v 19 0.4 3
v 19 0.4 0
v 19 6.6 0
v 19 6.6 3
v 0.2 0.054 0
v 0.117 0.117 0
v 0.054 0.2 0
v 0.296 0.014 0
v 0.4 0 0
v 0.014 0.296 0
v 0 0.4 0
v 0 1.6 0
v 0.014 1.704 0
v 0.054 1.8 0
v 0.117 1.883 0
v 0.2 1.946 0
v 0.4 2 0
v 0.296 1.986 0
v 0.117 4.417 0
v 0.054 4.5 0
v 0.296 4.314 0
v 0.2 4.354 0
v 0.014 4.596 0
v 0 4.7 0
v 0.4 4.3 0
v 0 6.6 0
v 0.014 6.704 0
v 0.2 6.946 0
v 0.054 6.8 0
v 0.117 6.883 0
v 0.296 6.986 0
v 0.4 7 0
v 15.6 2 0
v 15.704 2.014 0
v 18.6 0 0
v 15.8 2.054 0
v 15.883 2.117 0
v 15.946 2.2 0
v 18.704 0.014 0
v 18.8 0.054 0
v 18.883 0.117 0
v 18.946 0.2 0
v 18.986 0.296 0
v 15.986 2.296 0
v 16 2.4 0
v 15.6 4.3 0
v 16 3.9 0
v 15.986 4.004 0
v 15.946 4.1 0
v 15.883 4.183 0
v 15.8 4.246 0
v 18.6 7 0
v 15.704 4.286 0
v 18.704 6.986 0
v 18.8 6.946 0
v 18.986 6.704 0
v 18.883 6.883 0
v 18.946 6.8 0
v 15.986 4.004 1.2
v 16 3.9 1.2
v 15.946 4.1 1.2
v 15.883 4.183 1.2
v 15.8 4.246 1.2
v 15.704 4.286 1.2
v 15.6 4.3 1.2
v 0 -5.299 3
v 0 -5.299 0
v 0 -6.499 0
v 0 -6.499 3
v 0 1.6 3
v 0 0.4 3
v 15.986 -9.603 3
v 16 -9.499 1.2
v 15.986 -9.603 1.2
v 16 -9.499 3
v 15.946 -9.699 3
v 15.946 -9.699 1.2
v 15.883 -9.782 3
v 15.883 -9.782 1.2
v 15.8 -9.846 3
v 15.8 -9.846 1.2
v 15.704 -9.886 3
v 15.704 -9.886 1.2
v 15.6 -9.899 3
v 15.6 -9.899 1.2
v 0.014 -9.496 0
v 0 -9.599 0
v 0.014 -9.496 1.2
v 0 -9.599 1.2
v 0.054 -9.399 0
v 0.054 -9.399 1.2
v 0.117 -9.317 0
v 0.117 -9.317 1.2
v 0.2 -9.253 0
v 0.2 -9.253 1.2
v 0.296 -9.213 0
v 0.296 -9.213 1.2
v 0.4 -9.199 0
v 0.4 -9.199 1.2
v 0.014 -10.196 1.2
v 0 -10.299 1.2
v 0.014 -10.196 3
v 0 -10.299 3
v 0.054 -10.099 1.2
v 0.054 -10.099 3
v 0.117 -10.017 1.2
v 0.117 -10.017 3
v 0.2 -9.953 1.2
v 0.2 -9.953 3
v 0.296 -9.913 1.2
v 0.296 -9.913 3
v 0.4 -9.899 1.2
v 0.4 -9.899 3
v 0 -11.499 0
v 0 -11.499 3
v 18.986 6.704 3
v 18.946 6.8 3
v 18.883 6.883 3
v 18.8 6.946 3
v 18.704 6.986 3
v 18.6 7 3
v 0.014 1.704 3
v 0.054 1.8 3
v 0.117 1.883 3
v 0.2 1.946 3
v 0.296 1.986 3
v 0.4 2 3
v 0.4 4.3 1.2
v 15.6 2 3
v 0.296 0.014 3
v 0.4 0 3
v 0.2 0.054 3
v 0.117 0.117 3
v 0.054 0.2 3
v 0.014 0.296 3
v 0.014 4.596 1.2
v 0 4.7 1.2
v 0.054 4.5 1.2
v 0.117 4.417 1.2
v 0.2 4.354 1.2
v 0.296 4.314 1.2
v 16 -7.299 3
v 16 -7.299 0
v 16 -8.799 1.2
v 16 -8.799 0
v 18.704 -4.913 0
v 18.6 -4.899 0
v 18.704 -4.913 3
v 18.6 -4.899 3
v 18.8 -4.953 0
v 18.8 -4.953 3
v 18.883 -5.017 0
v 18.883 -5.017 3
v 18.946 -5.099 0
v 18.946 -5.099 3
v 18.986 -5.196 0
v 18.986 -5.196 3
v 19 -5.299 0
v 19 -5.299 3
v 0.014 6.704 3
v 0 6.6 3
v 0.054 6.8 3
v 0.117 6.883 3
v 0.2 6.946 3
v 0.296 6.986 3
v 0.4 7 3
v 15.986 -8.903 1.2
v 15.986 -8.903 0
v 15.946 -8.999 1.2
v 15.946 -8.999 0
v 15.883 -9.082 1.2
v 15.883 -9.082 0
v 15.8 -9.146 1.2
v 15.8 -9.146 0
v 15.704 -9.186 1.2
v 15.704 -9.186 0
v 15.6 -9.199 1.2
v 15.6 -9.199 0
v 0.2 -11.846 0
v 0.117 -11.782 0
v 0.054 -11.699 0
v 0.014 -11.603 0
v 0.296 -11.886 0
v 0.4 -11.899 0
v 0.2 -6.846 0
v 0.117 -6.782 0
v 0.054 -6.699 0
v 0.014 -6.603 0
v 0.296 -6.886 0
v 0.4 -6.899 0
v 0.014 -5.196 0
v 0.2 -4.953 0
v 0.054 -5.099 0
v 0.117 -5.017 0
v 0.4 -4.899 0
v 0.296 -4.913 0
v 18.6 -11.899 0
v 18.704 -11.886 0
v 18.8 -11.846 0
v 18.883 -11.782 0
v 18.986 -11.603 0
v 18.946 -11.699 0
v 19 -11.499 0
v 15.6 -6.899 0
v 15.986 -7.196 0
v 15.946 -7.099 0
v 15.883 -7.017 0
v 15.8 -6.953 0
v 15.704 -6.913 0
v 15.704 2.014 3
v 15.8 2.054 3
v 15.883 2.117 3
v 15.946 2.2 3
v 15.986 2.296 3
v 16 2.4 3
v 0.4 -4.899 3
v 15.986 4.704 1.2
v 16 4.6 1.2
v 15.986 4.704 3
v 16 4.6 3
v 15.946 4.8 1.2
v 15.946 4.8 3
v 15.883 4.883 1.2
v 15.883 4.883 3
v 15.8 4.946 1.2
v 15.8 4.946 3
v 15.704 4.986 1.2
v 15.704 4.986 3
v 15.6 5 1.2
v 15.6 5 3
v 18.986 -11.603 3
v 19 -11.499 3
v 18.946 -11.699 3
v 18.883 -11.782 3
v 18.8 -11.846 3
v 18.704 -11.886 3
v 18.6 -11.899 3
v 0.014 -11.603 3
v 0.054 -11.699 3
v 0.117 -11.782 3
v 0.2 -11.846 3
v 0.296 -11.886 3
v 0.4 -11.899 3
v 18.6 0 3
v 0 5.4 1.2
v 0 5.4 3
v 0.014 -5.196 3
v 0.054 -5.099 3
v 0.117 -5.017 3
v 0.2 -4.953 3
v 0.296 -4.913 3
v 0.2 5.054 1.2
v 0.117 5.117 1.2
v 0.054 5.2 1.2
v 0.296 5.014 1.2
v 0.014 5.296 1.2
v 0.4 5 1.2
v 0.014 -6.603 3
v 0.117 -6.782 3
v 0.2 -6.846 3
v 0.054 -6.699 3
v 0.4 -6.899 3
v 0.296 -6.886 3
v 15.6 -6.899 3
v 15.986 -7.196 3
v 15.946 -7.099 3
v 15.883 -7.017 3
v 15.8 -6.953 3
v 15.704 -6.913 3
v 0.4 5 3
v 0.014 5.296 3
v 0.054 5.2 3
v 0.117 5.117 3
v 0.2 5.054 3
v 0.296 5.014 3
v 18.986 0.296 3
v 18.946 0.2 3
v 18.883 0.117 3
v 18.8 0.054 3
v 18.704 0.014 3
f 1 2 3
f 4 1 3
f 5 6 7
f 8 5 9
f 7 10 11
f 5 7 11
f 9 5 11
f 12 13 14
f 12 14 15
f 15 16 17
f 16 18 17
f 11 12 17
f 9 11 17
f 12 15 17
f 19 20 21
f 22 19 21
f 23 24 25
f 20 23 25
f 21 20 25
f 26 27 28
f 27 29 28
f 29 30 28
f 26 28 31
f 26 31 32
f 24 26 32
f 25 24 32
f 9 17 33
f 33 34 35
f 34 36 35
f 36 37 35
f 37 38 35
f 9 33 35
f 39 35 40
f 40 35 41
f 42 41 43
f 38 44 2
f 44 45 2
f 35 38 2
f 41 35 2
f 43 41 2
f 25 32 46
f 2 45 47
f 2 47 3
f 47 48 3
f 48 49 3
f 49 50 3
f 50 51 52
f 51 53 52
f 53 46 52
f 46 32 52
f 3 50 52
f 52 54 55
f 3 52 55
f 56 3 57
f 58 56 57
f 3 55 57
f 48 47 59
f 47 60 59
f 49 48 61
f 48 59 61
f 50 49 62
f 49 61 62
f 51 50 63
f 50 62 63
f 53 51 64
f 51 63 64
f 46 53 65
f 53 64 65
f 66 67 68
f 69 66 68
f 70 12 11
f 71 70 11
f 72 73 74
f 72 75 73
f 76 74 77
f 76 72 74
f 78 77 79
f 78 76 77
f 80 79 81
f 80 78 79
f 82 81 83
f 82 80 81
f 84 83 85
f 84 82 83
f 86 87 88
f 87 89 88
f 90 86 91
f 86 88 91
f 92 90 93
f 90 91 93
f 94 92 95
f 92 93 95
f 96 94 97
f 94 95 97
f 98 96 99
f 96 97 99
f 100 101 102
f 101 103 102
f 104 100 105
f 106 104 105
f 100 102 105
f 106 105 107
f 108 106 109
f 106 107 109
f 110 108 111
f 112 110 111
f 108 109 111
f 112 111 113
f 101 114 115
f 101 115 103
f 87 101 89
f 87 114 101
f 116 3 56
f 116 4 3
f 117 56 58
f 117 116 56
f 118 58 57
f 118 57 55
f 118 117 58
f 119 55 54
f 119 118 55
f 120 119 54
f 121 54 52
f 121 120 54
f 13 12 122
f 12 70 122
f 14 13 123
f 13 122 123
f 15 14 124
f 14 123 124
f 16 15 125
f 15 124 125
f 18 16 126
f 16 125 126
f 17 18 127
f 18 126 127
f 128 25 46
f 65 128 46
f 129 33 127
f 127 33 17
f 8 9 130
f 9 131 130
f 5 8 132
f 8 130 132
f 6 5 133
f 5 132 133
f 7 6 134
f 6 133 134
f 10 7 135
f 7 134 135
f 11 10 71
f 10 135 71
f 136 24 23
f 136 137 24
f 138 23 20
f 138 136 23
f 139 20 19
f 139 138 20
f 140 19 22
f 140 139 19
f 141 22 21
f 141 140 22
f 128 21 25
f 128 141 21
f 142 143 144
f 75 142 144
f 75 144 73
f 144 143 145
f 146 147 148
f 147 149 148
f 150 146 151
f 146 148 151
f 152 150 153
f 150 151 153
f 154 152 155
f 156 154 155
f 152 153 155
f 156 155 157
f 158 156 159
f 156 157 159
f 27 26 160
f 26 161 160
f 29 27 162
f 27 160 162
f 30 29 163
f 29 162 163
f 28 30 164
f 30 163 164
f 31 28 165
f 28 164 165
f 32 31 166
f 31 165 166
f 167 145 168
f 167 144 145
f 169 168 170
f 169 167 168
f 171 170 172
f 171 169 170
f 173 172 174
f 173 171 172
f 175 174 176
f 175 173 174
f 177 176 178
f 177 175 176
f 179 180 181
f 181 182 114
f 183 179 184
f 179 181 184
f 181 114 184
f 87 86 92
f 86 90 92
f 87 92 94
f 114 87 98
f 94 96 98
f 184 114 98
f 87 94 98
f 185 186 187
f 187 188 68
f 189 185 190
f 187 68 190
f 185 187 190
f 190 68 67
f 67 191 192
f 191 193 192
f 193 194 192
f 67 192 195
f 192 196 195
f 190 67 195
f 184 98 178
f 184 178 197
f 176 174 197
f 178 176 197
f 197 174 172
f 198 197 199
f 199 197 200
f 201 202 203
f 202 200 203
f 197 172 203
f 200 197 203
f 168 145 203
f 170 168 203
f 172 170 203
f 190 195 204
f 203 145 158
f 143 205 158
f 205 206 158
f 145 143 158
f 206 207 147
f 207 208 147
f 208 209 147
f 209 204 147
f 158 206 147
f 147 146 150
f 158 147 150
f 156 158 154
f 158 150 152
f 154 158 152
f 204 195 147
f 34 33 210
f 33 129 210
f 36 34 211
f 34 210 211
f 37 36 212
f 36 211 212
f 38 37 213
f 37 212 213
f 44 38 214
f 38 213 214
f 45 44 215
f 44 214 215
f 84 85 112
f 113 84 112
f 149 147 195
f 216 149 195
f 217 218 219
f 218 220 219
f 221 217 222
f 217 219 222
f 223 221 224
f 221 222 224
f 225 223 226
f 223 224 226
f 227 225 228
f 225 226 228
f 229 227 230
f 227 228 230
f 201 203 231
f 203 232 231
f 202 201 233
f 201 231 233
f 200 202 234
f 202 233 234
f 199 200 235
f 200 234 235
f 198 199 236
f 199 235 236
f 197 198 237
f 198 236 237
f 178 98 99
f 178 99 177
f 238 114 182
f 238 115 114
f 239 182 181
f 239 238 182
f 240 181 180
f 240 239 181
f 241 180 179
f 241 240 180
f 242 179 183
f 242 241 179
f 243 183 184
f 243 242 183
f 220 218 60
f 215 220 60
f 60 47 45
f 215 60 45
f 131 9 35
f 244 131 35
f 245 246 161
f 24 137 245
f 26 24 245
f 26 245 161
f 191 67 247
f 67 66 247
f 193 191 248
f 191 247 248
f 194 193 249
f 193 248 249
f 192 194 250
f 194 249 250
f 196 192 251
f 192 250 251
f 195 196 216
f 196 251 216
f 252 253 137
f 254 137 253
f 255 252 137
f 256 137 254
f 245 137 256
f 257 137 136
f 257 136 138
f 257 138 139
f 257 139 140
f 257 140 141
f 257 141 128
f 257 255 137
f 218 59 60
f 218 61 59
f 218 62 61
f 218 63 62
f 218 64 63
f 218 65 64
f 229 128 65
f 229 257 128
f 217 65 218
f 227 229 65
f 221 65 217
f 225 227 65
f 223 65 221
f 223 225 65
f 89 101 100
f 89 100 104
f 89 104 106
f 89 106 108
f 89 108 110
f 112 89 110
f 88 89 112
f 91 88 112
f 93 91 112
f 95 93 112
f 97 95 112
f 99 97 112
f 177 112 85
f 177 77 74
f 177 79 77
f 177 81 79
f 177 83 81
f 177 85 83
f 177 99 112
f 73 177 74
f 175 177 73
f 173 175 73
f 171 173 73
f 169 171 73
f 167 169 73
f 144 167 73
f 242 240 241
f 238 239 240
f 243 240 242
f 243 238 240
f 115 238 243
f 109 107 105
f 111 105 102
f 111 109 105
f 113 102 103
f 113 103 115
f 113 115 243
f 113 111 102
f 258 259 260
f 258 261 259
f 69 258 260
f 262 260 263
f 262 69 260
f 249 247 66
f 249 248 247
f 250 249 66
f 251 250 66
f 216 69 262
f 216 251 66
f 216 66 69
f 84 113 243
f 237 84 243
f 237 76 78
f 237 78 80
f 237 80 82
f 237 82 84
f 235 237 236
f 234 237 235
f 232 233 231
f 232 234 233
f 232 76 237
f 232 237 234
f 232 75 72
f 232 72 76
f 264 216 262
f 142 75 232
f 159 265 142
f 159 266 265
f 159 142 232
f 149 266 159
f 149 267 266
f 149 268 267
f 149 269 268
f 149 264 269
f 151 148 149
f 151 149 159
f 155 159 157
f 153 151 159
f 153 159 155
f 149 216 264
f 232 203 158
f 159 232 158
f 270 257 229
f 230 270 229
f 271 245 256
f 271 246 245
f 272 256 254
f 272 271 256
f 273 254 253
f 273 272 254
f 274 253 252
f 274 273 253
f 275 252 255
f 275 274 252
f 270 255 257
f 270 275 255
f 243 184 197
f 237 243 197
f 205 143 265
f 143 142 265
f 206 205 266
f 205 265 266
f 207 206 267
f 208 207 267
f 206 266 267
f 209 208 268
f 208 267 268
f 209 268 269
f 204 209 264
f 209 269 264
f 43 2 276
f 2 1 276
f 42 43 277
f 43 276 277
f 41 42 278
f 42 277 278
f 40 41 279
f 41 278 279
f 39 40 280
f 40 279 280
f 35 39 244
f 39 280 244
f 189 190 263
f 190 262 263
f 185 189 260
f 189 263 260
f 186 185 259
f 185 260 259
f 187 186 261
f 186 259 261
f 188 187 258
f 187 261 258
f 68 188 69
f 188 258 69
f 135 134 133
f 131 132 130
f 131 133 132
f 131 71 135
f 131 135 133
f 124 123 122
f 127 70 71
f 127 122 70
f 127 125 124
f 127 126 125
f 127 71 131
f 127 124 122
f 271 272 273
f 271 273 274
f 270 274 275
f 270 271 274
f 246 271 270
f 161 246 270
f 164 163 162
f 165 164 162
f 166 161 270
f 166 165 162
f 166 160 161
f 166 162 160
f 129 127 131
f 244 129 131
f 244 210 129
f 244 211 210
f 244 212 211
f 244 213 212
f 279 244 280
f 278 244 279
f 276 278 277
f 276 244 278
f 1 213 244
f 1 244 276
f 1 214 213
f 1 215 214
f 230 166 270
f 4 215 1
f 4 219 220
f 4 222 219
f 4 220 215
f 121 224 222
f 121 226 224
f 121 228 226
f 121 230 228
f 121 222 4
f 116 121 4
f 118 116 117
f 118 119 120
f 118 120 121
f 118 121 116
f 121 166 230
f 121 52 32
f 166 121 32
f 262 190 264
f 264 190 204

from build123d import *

# Parameters (mm, degrees)
BOSS_EXTRUDE1_DEPTH   = 3
BOSS_EXTRUDE1_2_DEPTH = 3
SKETCH2_4_W           = 16
SKETCH2_4_H           = 0.7
BOSS_EXTRUDE3_DEPTH   = 1.2
FILLET2_R             = 0.4
FILLET3_R             = 0.4


with BuildPart() as part:
    # Sketch2 → Boss-Extrude1 (new body)
    with BuildSketch(Plane.XY):
        Polygon((0, 2), (0, 0), (19, 0), (19, 7), (0, 7), (0, 5), (16, 5), (16, 2), align=None)
    extrude(amount=BOSS_EXTRUDE1_DEPTH)



with BuildPart() as body_2:
    # Sketch2 → Boss-Extrude1 2 (new body)
    with BuildSketch(Plane.XY):
        Polygon((16, -6.899471306), (16, -9.899471306), (0, -9.899471306), (0, -11.899471306), (19, -11.899471306), (19, -4.899471306), (0, -4.899471306), (0, -6.899471306), align=None)
    extrude(amount=BOSS_EXTRUDE1_2_DEPTH)


with BuildPart() as part_1:
    add(part.part)

    add(body_2.part)  # Boss-Extrude3 merges body 2
    # Sketch2<4> → Boss-Extrude3 (add)
    with BuildSketch(Plane.XY):
        with Locations((8, 4.65)):
            Rectangle(SKETCH2_4_W, SKETCH2_4_H)
        with Locations((8, -9.549471306)):
            Rectangle(SKETCH2_4_W, SKETCH2_4_H)
    extrude(amount=BOSS_EXTRUDE3_DEPTH)

    # Fillet2
    fillet2_edges = [part_1.edges().sort_by_distance(p)[0] for p in [
        (0, 5, 2.1),
        (16, 2, 1.5),
        (16, 4.3, 0.6),
        (16, 5, 2.1),
        (19, 7, 1.5),
        (19, 0, 1.5),
        (0, 0, 1.5),
        (0, 2, 1.5),
        (0, 4.3, 0.6),
        (0, 7, 1.5),
    ]]
    fillet(fillet2_edges, radius=FILLET2_R)

    # Fillet3
    fillet3_edges = [part_1.edges().sort_by_distance(p)[0] for p in [
        (19, -11.899471306, 1.5),
        (19, -4.899471306, 1.5),
        (16, -6.899471306, 1.5),
        (16, -9.899471306, 2.1),
        (16, -9.199471306, 0.6),
        (0, -11.899471306, 1.5),
        (0, -9.899471306, 2.1),
        (0, -9.199471306, 0.6),
        (0, -4.899471306, 1.5),
        (0, -6.899471306, 1.5),
    ]]
    fillet(fillet3_edges, radius=FILLET3_R)


solid = part_1.part
